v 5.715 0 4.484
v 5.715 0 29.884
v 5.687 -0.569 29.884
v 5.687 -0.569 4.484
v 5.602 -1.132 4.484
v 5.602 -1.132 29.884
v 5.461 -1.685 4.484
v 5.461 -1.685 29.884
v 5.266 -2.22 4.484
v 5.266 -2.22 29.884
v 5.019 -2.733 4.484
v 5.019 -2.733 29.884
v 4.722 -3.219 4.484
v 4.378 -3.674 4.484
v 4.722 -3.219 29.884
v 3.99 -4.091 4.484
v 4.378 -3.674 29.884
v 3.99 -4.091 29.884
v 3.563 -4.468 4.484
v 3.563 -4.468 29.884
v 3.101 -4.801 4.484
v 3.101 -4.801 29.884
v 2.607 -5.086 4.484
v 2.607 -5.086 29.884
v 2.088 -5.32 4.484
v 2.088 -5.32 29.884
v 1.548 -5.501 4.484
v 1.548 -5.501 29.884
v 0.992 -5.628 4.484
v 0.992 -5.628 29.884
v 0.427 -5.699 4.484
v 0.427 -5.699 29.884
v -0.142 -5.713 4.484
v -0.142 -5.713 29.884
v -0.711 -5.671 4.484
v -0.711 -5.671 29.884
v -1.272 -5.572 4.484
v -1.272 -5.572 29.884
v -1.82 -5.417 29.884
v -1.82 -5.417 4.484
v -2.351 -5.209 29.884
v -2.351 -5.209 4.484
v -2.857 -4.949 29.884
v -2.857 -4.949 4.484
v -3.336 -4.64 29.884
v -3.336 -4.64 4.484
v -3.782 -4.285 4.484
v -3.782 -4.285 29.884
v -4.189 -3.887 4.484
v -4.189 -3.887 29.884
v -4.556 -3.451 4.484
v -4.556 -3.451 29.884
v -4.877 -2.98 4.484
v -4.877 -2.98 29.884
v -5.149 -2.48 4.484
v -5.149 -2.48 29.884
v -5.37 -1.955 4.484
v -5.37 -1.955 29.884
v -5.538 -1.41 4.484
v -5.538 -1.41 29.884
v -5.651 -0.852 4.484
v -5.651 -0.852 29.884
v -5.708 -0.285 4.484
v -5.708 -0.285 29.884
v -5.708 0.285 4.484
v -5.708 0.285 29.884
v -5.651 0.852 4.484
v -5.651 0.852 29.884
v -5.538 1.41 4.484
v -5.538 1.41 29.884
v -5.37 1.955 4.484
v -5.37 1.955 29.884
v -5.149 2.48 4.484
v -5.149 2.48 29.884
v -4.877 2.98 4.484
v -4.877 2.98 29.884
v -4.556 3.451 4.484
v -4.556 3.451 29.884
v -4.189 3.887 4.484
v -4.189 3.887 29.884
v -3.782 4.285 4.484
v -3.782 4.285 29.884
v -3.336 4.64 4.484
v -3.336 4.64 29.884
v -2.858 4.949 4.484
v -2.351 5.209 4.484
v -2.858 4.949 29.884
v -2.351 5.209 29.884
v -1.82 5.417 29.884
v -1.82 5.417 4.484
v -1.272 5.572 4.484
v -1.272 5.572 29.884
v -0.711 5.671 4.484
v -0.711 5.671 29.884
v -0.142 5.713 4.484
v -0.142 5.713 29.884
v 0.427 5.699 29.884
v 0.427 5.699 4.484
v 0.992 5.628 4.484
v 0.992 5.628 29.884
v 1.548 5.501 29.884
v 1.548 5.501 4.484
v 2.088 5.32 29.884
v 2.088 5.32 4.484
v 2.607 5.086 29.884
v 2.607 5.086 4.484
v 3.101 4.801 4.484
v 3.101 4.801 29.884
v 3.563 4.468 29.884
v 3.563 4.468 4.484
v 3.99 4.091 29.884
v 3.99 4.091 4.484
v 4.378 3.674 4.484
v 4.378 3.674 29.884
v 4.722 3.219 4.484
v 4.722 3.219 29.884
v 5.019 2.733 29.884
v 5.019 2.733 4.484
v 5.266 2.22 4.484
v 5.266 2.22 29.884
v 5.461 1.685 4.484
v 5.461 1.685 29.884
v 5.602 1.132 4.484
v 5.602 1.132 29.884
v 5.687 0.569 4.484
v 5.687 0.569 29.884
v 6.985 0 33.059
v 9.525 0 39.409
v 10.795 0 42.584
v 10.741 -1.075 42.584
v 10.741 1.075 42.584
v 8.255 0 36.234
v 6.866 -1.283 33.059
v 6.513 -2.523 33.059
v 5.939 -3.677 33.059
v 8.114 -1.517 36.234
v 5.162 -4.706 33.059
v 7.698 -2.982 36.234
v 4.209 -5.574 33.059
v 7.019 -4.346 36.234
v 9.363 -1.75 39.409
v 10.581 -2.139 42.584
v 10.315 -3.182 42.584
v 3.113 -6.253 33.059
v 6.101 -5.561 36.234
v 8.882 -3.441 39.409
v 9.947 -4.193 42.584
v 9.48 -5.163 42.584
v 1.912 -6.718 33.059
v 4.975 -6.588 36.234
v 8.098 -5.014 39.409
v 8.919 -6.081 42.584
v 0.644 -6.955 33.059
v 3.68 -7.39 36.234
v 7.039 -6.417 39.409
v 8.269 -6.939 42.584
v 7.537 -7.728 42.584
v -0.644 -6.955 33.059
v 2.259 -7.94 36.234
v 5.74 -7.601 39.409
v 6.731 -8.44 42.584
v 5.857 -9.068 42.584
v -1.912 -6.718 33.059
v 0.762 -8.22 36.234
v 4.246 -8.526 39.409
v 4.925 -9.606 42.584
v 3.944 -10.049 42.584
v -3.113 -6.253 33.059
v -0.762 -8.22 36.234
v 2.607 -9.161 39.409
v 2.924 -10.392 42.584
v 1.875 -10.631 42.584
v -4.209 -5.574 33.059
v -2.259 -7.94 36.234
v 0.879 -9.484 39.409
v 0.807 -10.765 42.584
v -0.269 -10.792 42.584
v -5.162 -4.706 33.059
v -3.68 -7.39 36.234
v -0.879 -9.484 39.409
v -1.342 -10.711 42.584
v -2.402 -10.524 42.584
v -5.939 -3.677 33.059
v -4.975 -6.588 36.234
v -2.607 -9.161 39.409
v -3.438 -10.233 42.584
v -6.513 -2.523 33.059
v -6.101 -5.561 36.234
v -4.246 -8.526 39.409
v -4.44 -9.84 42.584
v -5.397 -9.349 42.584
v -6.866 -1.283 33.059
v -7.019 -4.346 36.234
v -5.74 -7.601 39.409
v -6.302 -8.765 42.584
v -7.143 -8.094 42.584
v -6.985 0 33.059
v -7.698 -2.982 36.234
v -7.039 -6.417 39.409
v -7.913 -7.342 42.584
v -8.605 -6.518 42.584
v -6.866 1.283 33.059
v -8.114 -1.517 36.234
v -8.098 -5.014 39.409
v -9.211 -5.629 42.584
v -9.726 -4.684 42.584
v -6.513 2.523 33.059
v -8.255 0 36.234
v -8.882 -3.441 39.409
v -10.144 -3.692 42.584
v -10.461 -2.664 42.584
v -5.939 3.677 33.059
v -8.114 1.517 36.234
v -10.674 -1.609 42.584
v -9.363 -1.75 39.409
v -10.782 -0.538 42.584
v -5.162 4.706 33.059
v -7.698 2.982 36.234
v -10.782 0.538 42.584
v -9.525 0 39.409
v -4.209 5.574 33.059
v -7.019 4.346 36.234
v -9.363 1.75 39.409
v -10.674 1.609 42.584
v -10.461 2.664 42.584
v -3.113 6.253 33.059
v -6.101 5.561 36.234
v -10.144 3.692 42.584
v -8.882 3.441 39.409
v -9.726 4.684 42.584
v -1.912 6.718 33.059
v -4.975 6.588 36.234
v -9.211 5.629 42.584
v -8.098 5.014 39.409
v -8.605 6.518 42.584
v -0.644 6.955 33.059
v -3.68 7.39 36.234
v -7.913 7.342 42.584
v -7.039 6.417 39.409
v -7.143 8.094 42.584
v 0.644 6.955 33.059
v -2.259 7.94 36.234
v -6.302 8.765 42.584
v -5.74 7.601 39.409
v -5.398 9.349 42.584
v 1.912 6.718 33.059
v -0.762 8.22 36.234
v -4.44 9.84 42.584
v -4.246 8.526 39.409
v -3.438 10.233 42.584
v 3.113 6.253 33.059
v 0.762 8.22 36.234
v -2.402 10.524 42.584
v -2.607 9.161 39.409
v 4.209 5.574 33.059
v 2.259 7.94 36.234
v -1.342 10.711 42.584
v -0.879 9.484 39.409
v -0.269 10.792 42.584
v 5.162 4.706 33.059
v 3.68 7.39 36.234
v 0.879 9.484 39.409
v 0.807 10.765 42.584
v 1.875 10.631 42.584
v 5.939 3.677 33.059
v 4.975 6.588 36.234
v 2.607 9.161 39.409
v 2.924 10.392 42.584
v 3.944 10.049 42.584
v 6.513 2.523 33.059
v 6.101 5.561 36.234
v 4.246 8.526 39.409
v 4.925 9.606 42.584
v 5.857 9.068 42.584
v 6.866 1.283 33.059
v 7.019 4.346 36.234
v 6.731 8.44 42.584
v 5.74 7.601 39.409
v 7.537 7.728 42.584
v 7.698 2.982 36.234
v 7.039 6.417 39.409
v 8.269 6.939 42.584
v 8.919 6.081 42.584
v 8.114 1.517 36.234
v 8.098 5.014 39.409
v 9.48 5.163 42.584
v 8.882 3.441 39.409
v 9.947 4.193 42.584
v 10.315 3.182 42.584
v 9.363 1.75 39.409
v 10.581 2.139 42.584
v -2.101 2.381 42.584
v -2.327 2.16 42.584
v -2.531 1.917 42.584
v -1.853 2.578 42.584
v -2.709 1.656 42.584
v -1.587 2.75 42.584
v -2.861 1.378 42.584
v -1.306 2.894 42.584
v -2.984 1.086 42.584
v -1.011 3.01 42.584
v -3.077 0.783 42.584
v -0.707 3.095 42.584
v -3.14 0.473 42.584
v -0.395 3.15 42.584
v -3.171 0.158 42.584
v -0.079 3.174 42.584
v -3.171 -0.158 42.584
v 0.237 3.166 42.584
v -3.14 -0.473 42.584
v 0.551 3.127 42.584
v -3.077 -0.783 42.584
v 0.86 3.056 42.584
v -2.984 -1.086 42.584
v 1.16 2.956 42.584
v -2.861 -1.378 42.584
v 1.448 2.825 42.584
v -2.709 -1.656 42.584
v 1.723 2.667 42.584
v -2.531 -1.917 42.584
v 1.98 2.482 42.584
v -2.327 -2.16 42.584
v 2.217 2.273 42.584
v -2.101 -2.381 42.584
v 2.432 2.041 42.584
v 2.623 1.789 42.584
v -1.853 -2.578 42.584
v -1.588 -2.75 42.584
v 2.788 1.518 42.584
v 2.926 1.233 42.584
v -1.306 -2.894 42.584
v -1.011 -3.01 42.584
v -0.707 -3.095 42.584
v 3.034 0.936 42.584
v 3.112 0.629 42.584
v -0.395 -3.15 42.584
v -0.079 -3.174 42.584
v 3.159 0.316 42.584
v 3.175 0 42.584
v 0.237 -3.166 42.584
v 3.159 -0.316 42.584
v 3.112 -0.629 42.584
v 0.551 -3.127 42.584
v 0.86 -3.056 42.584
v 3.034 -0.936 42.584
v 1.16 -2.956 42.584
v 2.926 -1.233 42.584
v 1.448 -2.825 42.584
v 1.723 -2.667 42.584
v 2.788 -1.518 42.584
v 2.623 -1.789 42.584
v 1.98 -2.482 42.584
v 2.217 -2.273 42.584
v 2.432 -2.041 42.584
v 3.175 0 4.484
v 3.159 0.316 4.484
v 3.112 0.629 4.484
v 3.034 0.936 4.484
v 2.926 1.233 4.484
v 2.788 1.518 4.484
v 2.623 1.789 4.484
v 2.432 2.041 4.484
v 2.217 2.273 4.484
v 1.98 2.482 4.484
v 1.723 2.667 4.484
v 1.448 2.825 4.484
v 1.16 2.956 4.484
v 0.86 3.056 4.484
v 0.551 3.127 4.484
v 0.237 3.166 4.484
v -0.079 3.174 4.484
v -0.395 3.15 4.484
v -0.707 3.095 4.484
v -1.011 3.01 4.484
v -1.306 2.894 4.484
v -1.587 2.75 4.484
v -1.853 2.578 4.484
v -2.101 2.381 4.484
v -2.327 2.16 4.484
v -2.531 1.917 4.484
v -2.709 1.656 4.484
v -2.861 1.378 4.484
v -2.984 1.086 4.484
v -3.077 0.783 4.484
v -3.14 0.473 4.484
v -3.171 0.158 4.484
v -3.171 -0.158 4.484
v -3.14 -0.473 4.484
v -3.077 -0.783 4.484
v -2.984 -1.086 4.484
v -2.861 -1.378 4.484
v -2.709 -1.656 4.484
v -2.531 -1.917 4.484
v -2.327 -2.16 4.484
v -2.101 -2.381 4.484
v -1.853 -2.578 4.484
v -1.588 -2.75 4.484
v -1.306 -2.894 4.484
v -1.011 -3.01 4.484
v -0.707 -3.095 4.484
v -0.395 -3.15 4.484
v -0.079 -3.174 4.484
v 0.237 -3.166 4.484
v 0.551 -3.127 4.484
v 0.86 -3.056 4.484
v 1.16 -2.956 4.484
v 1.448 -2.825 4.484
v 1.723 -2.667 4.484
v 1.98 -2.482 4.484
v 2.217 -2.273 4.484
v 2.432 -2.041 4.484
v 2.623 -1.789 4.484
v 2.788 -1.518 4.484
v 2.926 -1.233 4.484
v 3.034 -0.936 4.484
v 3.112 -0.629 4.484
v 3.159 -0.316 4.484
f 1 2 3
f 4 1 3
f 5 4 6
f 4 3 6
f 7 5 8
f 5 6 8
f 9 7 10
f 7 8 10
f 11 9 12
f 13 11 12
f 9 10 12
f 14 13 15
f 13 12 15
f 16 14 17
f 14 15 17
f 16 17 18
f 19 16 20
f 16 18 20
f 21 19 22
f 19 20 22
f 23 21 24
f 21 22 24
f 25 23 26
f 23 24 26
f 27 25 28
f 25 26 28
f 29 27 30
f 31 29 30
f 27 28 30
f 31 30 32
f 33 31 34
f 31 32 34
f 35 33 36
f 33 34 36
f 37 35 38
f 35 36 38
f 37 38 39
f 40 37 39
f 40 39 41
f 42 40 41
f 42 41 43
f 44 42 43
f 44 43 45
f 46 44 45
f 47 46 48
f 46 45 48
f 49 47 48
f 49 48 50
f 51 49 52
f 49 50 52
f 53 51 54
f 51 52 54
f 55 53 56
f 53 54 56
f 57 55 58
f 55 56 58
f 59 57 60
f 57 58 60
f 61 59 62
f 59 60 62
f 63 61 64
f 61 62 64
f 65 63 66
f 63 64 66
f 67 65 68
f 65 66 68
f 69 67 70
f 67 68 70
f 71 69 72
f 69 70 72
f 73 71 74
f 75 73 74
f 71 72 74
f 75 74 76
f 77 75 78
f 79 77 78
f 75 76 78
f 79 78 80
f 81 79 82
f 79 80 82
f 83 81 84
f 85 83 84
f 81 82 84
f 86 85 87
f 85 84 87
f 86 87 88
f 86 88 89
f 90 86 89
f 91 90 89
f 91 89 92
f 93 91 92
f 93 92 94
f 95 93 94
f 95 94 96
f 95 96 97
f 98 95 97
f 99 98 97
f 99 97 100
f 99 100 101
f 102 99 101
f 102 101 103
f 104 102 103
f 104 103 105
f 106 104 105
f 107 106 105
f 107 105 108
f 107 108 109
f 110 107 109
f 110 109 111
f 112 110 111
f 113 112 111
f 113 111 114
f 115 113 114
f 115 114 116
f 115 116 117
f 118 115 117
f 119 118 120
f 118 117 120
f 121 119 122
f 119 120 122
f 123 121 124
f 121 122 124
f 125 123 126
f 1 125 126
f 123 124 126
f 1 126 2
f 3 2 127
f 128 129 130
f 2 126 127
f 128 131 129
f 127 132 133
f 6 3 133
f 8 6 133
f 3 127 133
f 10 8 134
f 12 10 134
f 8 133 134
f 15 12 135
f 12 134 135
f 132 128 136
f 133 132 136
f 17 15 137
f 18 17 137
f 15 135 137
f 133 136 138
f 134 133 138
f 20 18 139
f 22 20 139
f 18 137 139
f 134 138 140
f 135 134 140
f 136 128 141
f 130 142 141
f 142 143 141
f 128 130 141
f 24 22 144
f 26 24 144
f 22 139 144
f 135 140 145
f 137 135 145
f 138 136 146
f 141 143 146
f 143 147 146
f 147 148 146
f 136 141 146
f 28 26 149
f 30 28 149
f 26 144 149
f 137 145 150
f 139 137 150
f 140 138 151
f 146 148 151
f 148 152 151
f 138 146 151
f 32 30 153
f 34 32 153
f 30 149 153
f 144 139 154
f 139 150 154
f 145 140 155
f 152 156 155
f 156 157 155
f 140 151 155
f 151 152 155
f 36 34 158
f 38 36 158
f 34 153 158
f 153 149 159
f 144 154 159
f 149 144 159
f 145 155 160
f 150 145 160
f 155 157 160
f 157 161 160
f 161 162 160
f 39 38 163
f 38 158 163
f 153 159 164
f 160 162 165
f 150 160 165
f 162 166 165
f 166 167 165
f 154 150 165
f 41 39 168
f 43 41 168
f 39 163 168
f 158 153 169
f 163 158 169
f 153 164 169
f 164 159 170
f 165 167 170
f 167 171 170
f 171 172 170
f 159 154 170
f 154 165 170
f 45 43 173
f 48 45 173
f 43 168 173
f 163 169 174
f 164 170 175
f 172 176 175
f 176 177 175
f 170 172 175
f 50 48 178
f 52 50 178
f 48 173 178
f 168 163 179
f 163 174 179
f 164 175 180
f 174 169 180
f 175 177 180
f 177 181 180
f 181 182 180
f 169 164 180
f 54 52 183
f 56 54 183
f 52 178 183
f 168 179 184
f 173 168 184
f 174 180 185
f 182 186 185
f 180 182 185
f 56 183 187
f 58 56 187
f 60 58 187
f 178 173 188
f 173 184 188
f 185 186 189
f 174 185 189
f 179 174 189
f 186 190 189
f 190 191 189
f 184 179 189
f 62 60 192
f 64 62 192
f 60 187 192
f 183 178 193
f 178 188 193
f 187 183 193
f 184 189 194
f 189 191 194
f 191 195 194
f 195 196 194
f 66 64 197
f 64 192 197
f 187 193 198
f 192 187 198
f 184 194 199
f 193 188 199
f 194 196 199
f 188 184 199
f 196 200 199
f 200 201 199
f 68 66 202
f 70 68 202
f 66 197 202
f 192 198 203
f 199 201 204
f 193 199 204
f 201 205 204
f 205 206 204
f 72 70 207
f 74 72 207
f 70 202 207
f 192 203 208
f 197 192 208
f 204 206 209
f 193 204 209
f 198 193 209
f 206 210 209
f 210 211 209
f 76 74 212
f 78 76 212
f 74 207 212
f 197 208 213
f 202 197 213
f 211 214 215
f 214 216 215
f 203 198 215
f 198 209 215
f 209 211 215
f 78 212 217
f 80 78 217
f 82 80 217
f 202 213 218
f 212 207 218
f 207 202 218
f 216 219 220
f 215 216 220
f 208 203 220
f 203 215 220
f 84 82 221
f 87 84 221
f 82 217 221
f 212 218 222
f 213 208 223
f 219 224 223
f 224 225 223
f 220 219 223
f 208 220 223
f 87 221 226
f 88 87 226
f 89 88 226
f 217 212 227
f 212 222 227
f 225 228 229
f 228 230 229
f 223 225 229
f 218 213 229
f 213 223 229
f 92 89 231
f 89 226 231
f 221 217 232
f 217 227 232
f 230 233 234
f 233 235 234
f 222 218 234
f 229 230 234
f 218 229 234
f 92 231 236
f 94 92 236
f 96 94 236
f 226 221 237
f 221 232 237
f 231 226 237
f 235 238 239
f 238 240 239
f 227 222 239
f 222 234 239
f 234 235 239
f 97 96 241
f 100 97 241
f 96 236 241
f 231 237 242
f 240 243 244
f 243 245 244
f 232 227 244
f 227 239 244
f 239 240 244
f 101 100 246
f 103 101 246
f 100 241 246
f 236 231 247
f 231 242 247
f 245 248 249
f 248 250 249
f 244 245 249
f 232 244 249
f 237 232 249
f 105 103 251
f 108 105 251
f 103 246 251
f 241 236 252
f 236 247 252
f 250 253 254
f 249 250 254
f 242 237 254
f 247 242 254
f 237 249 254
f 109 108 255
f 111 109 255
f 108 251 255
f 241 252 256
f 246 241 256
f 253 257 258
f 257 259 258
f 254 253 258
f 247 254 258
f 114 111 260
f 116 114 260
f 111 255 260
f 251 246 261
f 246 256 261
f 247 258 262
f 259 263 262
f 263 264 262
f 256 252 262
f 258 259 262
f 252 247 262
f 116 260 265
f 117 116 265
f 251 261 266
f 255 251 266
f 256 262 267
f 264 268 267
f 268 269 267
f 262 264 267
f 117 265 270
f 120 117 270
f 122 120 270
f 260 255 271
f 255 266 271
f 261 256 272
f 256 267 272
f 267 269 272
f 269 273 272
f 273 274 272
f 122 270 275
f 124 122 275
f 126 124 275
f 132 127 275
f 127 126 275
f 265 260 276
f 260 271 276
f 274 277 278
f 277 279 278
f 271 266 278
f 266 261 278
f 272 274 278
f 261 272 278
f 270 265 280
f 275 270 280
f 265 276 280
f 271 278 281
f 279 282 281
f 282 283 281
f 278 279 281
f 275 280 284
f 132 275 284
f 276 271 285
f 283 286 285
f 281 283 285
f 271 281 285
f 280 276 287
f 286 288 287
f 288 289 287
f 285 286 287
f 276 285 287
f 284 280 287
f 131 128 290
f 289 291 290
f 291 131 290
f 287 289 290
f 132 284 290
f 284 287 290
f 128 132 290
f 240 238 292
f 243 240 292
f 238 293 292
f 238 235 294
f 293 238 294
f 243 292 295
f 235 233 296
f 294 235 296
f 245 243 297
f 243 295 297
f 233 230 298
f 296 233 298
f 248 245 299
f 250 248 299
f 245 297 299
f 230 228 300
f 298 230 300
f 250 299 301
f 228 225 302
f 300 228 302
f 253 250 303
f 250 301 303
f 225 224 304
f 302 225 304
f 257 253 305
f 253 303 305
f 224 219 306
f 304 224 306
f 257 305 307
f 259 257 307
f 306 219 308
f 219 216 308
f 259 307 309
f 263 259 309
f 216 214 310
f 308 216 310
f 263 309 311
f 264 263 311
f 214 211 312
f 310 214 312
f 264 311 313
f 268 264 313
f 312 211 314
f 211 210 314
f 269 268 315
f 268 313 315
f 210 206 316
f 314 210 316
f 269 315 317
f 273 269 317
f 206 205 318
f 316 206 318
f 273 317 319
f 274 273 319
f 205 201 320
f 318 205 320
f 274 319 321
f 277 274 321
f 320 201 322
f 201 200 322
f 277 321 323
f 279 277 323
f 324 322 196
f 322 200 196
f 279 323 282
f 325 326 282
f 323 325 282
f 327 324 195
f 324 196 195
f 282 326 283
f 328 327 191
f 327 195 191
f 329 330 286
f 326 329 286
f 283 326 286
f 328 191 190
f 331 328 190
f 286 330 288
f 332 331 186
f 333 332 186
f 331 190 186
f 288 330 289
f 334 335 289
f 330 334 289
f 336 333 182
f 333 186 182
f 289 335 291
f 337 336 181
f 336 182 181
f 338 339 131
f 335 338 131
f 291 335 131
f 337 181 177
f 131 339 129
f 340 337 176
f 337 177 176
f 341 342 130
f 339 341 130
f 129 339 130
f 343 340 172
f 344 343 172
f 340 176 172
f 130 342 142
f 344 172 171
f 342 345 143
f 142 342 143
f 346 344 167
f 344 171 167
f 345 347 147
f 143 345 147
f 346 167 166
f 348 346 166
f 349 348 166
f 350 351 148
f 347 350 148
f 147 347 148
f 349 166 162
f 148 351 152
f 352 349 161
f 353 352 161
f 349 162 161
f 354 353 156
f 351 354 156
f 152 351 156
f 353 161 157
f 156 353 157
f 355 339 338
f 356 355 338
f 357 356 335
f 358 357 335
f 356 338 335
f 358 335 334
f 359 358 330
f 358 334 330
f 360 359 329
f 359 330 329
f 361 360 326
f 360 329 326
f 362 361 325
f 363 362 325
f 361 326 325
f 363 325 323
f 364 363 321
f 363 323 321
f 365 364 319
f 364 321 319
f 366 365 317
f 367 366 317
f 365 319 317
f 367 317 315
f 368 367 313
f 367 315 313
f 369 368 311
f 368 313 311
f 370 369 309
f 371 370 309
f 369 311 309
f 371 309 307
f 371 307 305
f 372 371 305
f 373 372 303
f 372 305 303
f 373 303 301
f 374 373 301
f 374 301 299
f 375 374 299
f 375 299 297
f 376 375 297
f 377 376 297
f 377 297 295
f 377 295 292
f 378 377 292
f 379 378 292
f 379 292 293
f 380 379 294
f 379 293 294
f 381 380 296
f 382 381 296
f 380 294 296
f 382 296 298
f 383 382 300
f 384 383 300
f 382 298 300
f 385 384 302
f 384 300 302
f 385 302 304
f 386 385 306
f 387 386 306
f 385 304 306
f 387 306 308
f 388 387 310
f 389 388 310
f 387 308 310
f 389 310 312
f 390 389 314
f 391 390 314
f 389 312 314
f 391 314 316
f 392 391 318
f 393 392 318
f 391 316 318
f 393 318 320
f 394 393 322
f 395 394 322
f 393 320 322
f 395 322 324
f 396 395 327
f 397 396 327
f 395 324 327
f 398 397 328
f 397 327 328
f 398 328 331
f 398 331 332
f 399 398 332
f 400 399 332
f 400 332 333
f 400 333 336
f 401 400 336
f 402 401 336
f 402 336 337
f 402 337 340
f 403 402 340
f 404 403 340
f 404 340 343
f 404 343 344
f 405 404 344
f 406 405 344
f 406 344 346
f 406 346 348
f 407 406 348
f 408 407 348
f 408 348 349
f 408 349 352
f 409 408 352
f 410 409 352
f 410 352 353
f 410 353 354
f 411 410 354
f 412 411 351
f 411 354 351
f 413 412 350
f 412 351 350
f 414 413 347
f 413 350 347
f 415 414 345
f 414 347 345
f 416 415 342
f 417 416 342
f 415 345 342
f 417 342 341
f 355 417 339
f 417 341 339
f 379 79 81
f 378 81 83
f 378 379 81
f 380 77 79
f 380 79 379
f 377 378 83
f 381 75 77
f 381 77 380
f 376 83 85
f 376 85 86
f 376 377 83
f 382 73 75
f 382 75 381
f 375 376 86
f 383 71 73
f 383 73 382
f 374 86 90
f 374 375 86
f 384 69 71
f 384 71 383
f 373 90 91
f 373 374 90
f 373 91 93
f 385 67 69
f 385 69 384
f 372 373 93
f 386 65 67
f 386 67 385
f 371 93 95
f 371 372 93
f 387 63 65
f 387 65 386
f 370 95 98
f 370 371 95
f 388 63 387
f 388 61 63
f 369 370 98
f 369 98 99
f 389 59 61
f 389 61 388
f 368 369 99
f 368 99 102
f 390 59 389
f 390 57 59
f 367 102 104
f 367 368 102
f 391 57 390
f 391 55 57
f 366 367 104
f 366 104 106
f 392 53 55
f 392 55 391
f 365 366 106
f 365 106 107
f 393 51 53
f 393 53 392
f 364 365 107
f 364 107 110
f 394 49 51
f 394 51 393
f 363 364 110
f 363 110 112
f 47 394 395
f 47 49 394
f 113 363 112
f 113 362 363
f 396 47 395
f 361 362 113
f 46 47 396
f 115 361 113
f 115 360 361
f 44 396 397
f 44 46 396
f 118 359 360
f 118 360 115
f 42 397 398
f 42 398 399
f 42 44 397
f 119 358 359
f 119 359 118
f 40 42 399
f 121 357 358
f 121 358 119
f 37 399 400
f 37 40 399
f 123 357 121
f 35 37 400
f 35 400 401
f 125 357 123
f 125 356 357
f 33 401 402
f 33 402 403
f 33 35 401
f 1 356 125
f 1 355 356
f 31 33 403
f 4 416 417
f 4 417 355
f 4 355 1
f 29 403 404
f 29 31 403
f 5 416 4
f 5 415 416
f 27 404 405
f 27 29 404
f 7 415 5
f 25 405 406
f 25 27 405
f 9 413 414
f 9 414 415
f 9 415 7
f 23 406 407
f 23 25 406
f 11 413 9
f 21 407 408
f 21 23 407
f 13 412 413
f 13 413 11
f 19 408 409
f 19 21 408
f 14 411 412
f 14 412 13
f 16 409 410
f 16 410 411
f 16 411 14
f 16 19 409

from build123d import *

# Parameters (mm, degrees)
F2_R     = 5.715
F3_DEPTH = 25.4
F4_R     = 3.175
F5_DEPTH = 38.1


with BuildPart() as f1:
    # F0 (on Front) → F1 (revolve)
    with BuildSketch(Plane.XZ):
        Polygon((10.795, 42.584405), (0, 42.584405), (0, 29.884405), (5.715, 29.884405), align=None)
    revolve(axis=Axis((0, 0, 36.234405), (0, 0, -1)))

    # F2 (on face) → F3 (join)
    with BuildSketch(Plane(origin=(0, 0, 29.884405), x_dir=(1, 0, 0), z_dir=(0, 0, -1))):
        Circle(F2_R)
    extrude(amount=F3_DEPTH)

    # F4 (on face) → F5 (cut)
    with BuildSketch(Plane.XY.offset(42.584405)):
        Circle(F4_R)
    extrude(amount=-F5_DEPTH, mode=Mode.SUBTRACT)


solid = f1.part
